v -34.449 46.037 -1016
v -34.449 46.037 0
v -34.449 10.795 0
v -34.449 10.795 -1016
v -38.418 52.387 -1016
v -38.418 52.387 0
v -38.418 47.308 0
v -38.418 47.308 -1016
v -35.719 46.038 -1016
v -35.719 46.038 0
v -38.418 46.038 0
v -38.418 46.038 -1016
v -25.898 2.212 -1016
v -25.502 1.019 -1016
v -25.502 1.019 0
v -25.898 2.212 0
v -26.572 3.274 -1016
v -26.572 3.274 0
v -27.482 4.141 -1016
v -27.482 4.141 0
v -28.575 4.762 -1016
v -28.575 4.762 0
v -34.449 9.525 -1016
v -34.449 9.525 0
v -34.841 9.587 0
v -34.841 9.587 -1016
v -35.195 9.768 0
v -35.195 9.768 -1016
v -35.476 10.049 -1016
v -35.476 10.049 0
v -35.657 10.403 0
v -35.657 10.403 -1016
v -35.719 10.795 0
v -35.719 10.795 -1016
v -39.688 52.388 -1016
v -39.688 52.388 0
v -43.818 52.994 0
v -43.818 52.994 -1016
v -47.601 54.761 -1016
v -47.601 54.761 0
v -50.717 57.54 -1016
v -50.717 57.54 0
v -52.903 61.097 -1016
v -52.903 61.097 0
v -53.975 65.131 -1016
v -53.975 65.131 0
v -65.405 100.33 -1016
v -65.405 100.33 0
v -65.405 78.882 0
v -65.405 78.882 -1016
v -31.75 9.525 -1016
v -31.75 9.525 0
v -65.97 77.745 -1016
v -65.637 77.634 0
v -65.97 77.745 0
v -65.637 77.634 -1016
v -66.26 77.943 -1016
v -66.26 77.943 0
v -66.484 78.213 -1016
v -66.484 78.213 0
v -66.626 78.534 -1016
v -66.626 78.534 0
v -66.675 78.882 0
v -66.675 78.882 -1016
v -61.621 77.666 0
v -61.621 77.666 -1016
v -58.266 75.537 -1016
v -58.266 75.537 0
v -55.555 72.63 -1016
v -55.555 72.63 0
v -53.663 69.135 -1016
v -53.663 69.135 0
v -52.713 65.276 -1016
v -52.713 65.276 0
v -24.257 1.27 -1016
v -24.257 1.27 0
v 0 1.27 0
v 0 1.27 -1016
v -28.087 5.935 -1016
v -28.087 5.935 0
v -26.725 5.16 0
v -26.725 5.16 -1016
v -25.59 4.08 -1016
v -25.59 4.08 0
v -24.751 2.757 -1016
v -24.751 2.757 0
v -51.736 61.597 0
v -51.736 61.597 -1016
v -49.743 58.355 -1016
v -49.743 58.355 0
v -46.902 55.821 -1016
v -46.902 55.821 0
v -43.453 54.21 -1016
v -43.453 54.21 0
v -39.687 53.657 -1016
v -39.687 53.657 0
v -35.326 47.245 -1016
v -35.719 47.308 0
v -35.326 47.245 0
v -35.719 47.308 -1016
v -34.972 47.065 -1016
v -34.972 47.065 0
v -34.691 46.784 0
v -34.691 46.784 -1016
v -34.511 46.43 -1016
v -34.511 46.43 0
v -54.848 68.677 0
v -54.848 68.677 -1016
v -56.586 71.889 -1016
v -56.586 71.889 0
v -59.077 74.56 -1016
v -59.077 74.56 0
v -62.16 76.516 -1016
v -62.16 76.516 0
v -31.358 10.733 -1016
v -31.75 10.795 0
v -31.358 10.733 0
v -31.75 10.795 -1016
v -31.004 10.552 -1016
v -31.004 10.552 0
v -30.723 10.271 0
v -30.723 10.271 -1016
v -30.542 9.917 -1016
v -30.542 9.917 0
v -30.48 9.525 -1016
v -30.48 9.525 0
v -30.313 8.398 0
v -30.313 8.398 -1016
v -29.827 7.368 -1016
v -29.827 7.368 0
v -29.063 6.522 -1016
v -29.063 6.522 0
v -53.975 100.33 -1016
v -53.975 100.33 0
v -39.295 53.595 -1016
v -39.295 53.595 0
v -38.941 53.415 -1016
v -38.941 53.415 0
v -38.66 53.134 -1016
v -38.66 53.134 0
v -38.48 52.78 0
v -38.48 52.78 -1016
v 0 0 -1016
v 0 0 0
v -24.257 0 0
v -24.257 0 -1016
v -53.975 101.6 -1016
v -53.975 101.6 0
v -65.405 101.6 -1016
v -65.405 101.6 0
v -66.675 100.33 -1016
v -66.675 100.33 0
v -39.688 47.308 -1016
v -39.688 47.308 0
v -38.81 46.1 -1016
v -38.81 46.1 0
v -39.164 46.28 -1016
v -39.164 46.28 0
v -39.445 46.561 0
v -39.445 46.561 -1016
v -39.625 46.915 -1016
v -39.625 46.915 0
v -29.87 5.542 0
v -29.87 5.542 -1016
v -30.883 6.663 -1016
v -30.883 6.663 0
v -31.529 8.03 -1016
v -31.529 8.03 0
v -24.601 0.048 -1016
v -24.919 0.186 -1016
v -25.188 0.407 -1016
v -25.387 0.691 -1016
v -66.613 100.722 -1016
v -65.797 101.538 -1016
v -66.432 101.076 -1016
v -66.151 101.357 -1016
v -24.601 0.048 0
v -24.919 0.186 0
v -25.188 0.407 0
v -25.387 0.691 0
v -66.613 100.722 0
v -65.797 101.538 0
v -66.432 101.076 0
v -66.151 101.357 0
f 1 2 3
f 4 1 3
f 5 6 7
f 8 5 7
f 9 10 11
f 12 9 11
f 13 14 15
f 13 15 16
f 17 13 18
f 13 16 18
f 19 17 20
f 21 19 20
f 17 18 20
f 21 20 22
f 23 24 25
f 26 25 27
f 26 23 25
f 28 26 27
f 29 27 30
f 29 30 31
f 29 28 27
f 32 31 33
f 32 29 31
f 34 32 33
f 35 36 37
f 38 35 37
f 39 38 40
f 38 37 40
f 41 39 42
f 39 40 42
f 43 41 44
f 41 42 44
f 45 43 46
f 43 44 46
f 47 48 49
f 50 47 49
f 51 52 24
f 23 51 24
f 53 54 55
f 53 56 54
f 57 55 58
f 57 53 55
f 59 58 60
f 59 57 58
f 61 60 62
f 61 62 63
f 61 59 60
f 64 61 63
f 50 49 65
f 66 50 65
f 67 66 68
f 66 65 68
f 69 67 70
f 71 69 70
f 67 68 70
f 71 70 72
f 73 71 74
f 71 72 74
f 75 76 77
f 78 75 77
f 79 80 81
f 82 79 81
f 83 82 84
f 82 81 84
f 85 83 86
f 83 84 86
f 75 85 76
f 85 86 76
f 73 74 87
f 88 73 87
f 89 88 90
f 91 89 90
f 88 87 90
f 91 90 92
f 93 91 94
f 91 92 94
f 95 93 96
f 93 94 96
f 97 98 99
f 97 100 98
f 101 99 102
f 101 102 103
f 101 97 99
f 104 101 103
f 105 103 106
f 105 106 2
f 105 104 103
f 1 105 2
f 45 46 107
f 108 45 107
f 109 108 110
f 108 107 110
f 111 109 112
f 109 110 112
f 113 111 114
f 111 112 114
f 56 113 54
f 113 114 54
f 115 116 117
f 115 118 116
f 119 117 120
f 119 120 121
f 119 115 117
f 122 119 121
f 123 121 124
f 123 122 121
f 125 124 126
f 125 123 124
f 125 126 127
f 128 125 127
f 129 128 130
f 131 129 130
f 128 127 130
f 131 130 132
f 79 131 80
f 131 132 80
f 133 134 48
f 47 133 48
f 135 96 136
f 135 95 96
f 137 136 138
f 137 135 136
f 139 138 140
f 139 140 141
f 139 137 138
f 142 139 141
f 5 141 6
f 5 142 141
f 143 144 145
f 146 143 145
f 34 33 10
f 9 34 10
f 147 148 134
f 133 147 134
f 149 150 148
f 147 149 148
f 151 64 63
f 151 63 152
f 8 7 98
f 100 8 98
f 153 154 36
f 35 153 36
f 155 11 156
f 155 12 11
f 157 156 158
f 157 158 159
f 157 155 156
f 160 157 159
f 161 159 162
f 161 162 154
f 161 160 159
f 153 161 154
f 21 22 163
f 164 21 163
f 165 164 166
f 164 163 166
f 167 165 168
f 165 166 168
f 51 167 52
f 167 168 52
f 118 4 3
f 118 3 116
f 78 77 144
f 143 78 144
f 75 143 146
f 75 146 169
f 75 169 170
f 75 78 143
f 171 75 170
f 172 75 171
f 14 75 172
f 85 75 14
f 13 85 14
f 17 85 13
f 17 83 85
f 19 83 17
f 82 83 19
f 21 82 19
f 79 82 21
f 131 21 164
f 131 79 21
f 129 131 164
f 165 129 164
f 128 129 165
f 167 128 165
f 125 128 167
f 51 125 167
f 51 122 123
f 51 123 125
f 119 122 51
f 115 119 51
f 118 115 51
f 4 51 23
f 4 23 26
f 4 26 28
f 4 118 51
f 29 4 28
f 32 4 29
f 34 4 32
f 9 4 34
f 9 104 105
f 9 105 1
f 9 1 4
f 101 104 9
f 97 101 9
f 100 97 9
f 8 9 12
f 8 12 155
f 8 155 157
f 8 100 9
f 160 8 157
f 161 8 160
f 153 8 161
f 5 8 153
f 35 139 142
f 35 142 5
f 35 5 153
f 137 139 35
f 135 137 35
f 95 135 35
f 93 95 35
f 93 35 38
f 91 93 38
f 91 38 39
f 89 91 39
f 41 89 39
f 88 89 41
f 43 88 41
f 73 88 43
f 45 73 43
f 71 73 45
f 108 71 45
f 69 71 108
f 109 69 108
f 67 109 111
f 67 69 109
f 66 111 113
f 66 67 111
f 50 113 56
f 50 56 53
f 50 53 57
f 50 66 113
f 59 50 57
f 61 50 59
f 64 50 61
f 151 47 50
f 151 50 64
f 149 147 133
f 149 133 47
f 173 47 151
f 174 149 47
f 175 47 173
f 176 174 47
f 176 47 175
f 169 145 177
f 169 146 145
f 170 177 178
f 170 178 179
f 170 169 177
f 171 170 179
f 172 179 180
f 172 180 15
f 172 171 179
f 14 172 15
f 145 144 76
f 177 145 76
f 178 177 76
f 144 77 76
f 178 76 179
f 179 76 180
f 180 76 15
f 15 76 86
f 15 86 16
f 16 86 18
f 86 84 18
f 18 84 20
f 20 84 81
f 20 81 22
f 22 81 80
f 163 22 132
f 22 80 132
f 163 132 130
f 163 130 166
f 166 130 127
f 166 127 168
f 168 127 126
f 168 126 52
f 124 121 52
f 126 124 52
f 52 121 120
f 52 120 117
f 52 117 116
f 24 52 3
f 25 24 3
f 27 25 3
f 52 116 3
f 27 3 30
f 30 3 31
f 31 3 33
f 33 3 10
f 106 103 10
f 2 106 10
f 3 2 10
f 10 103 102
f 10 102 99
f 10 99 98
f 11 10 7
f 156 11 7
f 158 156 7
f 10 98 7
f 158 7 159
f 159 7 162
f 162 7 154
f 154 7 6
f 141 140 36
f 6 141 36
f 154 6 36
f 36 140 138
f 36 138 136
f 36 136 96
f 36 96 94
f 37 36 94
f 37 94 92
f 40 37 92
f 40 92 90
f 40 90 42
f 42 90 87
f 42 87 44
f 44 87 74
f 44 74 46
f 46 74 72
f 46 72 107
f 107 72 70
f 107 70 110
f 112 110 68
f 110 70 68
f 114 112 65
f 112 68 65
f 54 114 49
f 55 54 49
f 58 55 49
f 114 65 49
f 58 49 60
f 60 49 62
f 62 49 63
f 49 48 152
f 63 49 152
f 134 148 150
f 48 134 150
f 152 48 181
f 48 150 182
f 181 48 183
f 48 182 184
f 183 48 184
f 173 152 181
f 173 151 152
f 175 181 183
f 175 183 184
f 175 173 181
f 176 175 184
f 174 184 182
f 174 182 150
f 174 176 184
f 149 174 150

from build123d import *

# Parameters (mm, degrees)
EXTRUDE_THIN1_DEPTH = 1016
FILLET1_R           = 1.27


with BuildPart() as part:
    # Sketch1 → Extrude-Thin1 (new body)
    with BuildSketch(Plane.XY):
        with BuildLine():
            Line((0, 0), (-25.4, 0))
            ThreePointArc((-25.4, 0), (-26.266516, 2.861906), (-28.575, 4.7625))
            ThreePointArc((-28.575, 4.7625), (-30.883484, 6.663094), (-31.75, 9.525))
            Line((-31.75, 9.525), (-35.71875, 9.525))
            Line((-35.71875, 9.525), (-35.71875, 46.0375))
            Line((-35.71875, 46.0375), (-39.6875, 46.0375))
            Line((-39.6875, 46.0375), (-39.6875, 52.3875))
            ThreePointArc((-39.6875, 52.3875), (-49.260127, 56.036408), (-53.975, 65.131445))
            ThreePointArc((-53.975, 65.131445), (-58.111252, 73.680907), (-66.675, 77.7875))
            Line((-66.675, 77.7875), (-66.675, 101.6))
            Line((-66.675, 101.6), (-53.975, 101.6))
            Line((-53.975, 101.6), (-53.975, 100.33))
            Line((-53.975, 100.33), (-65.405, 100.33))
            Line((-65.405, 100.33), (-65.405, 78.882323))
            ThreePointArc((-65.405, 78.882323), (-56.817633, 74.169998), (-52.713255, 65.276013))
            ThreePointArc((-52.713255, 65.276013), (-47.930054, 56.572496), (-38.4175, 53.719154))
            Line((-38.4175, 53.719154), (-38.4175, 47.3075))
            Line((-38.4175, 47.3075), (-34.44875, 47.3075))
            Line((-34.44875, 47.3075), (-34.44875, 10.795))
            Line((-34.44875, 10.795), (-30.26681, 10.795))
            ThreePointArc((-30.26681, 10.795), (-30.139289, 7.933077), (-28.086538, 5.934808))
            ThreePointArc((-28.086538, 5.934808), (-25.590211, 4.079739), (-24.25668, 1.27))
            Line((-24.25668, 1.27), (0, 1.27))
            Line((0, 1.27), (0, 0))
        make_face()
    extrude(amount=-EXTRUDE_THIN1_DEPTH)

    # Fillet1
    fillet1_edges = [part.edges().sort_by_distance(p)[0] for p in [
        (-38.4175, 53.719154, -508),
        (-34.44875, 47.3075, -508),
        (-30.26681, 10.795, -508),
        (-25.4, 0, -508),
        (-35.71875, 9.525, -508),
        (-39.6875, 46.0375, -508),
        (-66.675, 77.7875, -508),
        (-66.675, 101.6, -508),
    ]]
    fillet(fillet1_edges, radius=FILLET1_R)


solid = part.part
